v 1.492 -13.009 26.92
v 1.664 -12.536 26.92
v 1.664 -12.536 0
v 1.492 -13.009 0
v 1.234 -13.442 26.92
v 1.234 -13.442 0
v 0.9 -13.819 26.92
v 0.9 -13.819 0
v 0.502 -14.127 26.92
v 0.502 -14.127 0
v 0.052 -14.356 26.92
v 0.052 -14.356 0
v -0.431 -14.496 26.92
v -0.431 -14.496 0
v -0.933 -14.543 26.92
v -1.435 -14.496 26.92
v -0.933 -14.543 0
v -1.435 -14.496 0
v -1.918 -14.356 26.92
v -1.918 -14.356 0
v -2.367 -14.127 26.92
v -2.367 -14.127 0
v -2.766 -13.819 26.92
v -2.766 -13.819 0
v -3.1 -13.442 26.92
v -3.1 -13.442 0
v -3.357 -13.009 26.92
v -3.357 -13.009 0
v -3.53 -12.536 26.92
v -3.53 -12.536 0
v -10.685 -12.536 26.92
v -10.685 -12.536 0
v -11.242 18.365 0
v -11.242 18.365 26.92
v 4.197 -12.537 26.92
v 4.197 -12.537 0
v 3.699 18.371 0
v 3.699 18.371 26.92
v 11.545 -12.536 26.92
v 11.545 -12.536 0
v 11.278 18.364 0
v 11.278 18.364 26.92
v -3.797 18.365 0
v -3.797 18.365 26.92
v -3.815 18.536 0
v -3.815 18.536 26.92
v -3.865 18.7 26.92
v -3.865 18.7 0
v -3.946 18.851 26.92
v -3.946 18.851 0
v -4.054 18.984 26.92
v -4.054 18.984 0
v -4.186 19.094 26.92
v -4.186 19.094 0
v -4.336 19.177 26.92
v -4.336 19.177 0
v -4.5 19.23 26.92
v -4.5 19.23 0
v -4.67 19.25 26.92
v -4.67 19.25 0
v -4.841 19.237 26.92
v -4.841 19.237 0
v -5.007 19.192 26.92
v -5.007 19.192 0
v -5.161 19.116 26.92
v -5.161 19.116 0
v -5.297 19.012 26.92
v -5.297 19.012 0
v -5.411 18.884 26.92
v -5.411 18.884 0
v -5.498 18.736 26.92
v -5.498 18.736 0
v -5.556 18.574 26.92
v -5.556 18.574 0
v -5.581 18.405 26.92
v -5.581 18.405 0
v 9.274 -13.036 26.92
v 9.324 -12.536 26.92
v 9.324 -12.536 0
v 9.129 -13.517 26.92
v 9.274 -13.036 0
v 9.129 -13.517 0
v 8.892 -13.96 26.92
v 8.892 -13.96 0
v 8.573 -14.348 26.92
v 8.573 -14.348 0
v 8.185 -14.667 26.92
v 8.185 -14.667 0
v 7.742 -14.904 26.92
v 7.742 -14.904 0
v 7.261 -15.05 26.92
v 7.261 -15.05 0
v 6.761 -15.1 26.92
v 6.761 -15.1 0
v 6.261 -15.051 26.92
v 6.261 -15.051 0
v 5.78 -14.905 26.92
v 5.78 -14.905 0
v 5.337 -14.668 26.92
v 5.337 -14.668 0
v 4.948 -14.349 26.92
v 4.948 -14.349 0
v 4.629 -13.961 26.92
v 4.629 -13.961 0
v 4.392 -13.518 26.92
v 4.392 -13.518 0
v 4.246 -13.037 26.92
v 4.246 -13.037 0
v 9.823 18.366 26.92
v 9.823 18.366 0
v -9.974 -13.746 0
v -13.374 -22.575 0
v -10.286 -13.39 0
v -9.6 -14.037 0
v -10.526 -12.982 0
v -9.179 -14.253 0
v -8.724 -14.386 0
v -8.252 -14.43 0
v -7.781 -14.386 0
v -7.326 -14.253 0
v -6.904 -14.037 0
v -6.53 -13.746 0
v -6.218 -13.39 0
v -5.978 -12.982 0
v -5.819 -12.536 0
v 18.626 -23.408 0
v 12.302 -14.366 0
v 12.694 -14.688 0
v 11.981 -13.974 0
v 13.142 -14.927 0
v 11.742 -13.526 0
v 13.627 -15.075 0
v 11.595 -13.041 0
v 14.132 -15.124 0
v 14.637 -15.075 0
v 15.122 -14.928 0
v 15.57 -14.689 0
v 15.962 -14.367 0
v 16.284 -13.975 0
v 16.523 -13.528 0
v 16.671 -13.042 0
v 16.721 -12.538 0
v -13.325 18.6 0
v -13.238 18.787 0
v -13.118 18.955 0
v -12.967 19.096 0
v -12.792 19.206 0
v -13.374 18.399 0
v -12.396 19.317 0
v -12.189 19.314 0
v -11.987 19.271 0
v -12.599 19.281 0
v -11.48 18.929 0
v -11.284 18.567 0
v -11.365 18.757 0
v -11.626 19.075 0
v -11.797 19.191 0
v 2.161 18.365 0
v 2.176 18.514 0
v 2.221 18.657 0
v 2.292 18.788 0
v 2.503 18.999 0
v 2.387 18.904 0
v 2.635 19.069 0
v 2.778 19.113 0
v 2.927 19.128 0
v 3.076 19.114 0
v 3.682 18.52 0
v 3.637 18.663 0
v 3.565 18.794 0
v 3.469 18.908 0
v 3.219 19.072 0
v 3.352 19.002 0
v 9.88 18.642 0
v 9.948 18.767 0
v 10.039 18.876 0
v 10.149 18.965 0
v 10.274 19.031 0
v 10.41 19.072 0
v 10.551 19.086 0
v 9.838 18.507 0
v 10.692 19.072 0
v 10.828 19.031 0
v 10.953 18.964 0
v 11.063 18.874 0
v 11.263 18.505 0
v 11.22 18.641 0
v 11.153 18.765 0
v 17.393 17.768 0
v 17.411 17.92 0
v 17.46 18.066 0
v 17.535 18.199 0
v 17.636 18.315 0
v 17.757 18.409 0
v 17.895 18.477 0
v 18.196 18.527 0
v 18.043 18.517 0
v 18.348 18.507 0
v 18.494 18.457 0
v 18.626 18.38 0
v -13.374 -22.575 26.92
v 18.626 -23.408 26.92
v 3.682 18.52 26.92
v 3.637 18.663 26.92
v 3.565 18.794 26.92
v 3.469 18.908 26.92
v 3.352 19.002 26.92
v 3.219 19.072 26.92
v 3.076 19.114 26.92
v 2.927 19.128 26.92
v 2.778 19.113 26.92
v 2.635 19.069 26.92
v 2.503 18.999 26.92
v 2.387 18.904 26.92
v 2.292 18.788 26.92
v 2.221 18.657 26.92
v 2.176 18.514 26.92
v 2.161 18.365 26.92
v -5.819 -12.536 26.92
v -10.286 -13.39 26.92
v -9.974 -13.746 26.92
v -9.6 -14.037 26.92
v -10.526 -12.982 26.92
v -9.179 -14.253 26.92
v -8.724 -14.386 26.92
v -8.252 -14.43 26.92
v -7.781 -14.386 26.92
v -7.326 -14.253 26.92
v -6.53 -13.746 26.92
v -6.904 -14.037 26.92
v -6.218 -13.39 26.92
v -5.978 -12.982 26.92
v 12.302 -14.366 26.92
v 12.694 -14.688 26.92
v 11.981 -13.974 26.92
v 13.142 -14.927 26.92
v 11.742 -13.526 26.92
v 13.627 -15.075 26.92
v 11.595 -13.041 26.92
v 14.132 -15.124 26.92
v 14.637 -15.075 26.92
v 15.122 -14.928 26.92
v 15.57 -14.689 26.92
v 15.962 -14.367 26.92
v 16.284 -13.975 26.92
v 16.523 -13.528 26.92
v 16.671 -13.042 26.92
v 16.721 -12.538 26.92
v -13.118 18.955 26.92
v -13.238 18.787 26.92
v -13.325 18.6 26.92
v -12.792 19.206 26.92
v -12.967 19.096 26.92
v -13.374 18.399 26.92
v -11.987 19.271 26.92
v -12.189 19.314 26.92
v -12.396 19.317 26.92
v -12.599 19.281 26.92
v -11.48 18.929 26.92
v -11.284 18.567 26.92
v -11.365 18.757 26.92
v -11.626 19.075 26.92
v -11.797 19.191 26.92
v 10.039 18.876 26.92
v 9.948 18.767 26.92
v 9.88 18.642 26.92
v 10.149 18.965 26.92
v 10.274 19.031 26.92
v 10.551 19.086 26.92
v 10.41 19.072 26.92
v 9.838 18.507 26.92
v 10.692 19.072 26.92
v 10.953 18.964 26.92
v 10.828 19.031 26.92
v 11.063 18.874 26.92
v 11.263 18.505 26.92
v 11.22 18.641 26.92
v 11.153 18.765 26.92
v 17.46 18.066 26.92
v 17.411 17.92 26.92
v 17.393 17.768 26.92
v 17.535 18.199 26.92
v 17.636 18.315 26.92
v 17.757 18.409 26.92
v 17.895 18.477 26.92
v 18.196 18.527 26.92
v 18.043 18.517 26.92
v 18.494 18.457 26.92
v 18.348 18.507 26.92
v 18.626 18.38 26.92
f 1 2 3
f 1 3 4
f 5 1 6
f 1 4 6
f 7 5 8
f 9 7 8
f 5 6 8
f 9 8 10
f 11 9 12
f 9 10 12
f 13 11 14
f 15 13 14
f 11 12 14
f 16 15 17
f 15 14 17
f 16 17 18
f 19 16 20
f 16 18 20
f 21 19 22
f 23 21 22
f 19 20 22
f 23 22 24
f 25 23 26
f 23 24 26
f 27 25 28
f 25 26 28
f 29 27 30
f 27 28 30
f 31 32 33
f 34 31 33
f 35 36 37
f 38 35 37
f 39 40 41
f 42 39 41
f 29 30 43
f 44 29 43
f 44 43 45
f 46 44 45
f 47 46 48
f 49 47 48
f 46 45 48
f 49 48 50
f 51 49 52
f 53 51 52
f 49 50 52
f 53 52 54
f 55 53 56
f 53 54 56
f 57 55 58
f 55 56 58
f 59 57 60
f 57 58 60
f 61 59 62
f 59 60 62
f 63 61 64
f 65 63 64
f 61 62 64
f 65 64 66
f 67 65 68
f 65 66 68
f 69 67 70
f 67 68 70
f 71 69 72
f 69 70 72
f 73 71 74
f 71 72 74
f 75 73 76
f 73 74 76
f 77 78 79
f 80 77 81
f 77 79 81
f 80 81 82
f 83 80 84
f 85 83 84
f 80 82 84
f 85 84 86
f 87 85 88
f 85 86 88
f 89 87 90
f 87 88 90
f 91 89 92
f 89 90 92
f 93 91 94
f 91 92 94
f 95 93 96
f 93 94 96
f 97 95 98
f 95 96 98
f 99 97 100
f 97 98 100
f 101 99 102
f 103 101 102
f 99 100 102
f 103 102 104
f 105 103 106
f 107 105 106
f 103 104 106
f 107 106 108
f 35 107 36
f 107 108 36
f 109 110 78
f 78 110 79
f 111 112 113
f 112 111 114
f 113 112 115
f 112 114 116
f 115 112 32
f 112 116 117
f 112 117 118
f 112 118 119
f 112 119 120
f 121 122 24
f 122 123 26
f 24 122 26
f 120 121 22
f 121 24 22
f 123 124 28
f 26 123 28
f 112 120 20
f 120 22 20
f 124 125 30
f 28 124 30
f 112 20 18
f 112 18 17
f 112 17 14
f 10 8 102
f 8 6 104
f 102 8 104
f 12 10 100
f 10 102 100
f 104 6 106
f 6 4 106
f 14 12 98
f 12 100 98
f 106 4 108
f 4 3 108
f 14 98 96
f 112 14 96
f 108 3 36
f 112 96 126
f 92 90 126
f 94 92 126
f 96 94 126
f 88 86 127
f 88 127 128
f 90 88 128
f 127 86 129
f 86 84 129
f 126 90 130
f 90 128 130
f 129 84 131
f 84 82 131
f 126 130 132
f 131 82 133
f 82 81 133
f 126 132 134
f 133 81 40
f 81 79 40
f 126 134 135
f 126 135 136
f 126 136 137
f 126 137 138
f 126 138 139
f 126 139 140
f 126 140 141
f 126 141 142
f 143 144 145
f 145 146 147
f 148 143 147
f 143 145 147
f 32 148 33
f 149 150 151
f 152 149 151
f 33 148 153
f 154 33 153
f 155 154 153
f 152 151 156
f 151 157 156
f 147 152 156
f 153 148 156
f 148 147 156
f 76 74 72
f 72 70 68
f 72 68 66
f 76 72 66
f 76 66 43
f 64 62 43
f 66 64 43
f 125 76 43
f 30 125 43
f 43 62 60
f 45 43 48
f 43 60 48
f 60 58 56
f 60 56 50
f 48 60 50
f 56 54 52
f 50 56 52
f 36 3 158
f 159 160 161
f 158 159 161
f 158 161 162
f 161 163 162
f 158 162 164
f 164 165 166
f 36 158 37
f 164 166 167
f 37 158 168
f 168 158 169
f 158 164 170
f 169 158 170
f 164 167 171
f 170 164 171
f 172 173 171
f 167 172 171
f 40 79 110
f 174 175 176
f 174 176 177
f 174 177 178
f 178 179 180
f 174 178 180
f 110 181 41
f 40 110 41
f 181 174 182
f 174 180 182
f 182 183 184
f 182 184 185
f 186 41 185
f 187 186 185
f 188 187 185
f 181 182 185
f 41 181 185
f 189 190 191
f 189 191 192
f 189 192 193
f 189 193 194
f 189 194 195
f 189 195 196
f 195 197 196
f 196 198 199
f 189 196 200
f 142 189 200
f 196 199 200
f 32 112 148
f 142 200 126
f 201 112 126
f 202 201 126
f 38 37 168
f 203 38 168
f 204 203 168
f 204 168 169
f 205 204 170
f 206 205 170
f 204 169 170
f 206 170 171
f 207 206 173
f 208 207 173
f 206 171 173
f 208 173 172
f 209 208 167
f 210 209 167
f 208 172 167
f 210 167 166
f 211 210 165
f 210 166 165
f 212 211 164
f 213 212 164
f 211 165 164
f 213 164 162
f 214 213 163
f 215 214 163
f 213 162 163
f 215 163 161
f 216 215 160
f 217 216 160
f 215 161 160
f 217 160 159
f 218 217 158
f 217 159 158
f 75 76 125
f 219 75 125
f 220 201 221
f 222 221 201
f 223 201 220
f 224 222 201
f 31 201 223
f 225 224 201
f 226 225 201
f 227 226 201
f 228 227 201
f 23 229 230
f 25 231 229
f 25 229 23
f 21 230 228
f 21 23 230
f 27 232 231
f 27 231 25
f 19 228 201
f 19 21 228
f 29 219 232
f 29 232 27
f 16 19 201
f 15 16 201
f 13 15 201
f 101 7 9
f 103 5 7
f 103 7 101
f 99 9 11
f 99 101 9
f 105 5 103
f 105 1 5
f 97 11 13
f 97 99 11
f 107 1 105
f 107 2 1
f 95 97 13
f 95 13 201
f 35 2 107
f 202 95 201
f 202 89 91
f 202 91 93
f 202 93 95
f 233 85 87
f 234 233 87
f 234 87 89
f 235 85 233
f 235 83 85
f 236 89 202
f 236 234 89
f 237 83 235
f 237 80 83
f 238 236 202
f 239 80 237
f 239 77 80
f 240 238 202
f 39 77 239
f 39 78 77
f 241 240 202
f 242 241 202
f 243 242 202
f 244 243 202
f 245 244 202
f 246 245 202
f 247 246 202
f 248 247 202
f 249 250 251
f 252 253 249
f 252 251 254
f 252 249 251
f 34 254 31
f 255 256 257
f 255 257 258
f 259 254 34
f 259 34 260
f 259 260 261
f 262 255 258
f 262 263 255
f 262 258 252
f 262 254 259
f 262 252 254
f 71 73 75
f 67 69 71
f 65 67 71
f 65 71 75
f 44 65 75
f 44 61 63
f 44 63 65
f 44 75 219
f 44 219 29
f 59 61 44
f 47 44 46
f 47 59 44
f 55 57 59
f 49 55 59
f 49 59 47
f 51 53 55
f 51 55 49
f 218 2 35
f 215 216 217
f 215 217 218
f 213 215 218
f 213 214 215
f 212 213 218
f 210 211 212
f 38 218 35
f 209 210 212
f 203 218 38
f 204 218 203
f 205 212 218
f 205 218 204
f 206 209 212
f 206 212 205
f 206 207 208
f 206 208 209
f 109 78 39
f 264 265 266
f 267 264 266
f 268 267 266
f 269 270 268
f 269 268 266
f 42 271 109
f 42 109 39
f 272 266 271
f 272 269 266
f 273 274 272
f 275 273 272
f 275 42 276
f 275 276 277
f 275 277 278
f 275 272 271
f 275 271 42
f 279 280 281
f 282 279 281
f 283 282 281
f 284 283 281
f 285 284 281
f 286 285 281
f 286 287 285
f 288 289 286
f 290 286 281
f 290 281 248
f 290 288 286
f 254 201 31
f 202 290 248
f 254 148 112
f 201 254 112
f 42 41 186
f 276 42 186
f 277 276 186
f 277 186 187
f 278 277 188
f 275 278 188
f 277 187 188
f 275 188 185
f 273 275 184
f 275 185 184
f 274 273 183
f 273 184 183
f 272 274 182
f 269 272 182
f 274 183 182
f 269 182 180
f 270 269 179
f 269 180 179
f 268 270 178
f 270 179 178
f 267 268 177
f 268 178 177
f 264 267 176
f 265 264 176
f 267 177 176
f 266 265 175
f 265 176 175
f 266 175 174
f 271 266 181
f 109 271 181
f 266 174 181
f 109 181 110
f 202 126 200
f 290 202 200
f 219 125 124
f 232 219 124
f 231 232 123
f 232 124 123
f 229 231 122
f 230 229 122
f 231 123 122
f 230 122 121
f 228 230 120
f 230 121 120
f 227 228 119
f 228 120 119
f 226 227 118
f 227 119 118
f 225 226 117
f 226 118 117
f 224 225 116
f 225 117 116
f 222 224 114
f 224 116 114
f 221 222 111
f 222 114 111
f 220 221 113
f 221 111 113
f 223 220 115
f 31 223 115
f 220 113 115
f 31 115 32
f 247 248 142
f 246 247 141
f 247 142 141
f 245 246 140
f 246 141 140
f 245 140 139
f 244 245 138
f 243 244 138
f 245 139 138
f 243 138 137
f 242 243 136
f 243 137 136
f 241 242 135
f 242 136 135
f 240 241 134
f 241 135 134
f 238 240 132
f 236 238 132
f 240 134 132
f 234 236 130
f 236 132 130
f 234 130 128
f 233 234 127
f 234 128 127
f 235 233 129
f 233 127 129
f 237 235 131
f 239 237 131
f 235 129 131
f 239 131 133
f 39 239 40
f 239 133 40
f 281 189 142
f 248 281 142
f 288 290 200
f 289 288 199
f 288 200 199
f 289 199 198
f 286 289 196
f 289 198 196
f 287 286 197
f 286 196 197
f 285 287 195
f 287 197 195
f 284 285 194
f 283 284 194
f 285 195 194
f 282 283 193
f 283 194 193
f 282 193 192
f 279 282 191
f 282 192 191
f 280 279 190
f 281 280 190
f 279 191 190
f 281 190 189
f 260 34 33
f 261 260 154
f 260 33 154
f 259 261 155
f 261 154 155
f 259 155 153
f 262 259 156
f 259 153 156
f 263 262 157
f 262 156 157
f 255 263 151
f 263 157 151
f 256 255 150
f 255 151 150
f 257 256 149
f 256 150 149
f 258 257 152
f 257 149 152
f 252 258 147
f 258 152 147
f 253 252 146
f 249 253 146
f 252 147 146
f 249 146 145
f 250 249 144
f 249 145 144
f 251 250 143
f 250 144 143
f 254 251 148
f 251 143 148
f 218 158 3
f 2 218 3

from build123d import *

# Parameters (mm, degrees)
F1_DEPTH = 26.92


with BuildPart() as f1:
    # F0 (on Top) → F1 (new body)
    with BuildSketch(Plane.XY):
        with BuildLine():
            ThreePointArc((-11.241594, 18.364918), (-12.292704, 19.320588), (-13.373895, 18.399088))
            Line((-13.373895, 18.399088), (-13.373895, -22.575411))
            Line((-13.373895, -22.575411), (18.626105, -23.408137))
            Line((18.626105, -23.408137), (18.626105, 18.379824))
            ThreePointArc((18.626105, 18.379824), (17.824413, 18.44657), (17.392959, 17.767591))
            Line((17.392959, 17.767591), (16.720654, -12.537674))
            ThreePointArc((16.720654, -12.537674), (14.131955, -15.124464), (11.545165, -12.535765))
            Line((11.545165, -12.535765), (11.277532, 18.364451))
            ThreePointArc((11.277532, 18.364451), (10.550878, 19.085636), (9.822628, 18.366063))
            Line((9.822628, 18.366063), (9.323563, -12.535565))
            ThreePointArc((9.323563, -12.535565), (6.76096, -15.09974), (4.196786, -12.537137))
            Line((4.196786, -12.537137), (3.699317, 18.3712))
            ThreePointArc((3.699317, 18.3712), (2.92693, 19.128157), (2.160752, 18.364918))
            Line((2.160752, 18.364918), (1.663561, -12.535565))
            ThreePointArc((1.663561, -12.535565), (-0.932977, -14.543026), (-3.529515, -12.535565))
            Line((-3.529515, -12.535565), (-3.79715, 18.364918))
            ThreePointArc((-3.79715, 18.364918), (-4.670126, 19.249776), (-5.581484, 18.404502))
            Line((-5.581484, 18.404502), (-5.8192, -12.535565))
            ThreePointArc((-5.8192, -12.535565), (-8.252189, -14.43033), (-10.685177, -12.535565))
            Line((-10.685177, -12.535565), (-11.241594, 18.364918))
        make_face()
    extrude(amount=F1_DEPTH)


solid = f1.part
